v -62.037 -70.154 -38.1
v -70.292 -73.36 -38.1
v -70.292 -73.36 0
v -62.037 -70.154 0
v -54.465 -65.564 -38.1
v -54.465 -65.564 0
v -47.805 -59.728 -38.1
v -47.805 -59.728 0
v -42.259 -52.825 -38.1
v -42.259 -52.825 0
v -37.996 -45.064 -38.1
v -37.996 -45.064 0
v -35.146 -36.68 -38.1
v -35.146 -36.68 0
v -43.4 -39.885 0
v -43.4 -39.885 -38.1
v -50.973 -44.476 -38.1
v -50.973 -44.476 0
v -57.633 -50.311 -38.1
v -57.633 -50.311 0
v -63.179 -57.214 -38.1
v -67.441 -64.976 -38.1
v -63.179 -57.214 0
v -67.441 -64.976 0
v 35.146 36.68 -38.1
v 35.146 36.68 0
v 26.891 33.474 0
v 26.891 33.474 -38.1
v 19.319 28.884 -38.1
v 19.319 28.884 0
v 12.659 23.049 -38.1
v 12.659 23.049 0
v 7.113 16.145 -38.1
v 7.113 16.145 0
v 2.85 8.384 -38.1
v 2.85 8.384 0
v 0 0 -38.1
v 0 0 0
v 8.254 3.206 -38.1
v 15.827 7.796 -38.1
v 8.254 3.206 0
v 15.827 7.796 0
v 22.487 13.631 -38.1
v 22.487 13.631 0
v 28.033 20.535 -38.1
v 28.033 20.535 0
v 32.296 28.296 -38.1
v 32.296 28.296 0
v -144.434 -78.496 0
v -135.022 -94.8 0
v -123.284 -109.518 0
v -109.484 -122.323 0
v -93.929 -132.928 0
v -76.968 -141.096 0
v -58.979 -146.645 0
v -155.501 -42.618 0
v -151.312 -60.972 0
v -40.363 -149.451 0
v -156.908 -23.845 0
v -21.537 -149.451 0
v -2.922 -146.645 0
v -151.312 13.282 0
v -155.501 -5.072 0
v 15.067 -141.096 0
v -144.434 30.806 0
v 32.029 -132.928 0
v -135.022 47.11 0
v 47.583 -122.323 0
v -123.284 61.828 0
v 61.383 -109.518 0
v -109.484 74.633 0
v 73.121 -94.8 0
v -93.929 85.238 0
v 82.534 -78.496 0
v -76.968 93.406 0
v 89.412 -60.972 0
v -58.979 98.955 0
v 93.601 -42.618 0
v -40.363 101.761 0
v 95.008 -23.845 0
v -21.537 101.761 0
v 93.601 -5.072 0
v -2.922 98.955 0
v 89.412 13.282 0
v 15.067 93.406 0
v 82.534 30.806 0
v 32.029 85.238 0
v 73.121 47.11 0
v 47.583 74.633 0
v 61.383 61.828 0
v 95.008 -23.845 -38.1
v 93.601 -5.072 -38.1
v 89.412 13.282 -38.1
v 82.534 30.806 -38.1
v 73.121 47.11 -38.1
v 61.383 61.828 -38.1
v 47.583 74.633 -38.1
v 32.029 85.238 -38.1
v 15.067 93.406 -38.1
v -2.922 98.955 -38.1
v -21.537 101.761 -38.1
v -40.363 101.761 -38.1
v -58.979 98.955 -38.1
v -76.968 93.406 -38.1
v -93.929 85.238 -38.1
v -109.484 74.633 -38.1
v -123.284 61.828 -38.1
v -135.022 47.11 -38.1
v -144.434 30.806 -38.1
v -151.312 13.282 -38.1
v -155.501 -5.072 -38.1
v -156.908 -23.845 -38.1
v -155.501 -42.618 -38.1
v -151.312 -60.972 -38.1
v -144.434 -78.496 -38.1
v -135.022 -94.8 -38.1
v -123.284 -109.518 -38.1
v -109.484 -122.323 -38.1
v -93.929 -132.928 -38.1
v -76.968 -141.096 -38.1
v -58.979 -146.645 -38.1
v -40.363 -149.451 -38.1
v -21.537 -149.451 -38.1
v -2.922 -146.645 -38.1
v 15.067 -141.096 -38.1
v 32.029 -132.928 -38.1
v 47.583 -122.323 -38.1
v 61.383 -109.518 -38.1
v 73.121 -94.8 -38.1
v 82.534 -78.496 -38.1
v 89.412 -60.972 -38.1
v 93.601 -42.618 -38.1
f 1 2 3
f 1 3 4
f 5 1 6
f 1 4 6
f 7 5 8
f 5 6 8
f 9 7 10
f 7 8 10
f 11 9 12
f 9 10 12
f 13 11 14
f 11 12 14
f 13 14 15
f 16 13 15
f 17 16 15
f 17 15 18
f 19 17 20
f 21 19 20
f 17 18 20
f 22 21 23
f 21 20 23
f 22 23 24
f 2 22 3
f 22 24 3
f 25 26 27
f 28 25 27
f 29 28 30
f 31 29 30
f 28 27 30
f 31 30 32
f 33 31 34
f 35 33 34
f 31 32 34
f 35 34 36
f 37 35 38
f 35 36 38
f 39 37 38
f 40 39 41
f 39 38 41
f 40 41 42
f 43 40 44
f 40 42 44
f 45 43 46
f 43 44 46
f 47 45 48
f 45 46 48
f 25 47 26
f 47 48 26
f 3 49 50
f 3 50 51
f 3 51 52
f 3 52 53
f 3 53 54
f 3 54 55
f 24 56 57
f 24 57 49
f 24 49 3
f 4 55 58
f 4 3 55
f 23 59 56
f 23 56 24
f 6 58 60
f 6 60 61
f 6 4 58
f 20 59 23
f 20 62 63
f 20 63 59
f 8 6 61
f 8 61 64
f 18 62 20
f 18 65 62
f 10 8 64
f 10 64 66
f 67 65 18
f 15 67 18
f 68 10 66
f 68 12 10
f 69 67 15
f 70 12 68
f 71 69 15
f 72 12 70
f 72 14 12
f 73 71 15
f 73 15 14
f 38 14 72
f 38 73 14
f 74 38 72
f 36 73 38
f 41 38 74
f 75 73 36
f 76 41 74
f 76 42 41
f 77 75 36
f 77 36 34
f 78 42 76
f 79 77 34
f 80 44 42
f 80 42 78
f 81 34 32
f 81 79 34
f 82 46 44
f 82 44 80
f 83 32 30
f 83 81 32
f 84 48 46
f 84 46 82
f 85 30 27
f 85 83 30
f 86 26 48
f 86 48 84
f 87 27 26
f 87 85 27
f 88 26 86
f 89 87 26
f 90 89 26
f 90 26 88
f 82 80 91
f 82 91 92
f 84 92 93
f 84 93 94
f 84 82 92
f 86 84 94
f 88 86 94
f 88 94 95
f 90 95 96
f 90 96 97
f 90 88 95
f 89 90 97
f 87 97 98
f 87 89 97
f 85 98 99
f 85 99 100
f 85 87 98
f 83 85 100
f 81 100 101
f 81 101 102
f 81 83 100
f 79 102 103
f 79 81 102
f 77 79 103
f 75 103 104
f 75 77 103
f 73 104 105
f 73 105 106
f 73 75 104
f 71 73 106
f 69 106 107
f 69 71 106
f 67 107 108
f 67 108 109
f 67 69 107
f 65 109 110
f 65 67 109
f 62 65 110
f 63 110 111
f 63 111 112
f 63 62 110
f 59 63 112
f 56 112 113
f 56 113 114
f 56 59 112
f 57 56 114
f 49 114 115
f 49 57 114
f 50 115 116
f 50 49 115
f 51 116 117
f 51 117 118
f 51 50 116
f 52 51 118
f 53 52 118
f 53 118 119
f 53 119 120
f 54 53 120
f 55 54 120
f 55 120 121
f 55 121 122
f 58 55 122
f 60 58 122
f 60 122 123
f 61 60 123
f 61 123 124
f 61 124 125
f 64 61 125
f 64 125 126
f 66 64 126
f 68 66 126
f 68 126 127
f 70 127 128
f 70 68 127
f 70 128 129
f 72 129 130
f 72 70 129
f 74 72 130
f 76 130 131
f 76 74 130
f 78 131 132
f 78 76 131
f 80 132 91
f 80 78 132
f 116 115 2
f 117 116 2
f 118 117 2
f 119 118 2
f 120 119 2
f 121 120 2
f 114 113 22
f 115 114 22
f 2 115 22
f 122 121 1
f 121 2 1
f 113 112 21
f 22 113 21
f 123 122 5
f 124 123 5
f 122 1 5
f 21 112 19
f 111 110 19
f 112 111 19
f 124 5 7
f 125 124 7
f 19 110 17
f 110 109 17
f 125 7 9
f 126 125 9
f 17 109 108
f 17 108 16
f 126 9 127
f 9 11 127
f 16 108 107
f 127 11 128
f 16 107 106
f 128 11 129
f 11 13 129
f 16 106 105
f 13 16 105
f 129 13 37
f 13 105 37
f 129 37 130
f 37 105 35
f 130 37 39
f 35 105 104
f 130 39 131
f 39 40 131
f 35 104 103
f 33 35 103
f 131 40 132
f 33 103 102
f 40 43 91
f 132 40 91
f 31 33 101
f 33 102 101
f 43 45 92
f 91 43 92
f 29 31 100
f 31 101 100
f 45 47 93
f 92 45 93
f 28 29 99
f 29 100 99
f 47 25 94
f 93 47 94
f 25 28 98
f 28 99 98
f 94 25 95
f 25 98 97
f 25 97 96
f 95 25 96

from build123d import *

# Parameters (mm, degrees)
F0_R     = 125.9579420201
F1_DEPTH = 38.1
F3_DEPTH = 38.101


with BuildPart() as f1:
    # F0 (on Top) → F1 (new body)
    with BuildSketch(Plane.XY):
        with Locations((-30.9502501041, -23.8450411707)):
            Circle(F0_R)
    extrude(amount=-F1_DEPTH)

    # F2 (on Top) → F3 (cut, through all)
    with BuildSketch(Plane.XY):
        with BuildLine():
            ThreePointArc((-6.9e-08, -2.01e-08), (22.4870883881, 13.6312603216), (35.1458480619, 36.6798223007))
            ThreePointArc((35.1458480619, 36.6798223007), (12.6587596337, 23.0485619372), (-1.05e-08, -4.28e-08))
        make_face()
        with BuildLine():
            ThreePointArc((-70.2916961239, -73.3596446013), (-47.8046076956, -59.7283842378), (-35.1458480514, -36.6798222578))
            ThreePointArc((-35.1458480539, -36.6798222983), (-57.632936472, -50.3110826452), (-70.2916961239, -73.3596446013))
        make_face()
    extrude(amount=-F3_DEPTH, mode=Mode.SUBTRACT)


solid = f1.part
